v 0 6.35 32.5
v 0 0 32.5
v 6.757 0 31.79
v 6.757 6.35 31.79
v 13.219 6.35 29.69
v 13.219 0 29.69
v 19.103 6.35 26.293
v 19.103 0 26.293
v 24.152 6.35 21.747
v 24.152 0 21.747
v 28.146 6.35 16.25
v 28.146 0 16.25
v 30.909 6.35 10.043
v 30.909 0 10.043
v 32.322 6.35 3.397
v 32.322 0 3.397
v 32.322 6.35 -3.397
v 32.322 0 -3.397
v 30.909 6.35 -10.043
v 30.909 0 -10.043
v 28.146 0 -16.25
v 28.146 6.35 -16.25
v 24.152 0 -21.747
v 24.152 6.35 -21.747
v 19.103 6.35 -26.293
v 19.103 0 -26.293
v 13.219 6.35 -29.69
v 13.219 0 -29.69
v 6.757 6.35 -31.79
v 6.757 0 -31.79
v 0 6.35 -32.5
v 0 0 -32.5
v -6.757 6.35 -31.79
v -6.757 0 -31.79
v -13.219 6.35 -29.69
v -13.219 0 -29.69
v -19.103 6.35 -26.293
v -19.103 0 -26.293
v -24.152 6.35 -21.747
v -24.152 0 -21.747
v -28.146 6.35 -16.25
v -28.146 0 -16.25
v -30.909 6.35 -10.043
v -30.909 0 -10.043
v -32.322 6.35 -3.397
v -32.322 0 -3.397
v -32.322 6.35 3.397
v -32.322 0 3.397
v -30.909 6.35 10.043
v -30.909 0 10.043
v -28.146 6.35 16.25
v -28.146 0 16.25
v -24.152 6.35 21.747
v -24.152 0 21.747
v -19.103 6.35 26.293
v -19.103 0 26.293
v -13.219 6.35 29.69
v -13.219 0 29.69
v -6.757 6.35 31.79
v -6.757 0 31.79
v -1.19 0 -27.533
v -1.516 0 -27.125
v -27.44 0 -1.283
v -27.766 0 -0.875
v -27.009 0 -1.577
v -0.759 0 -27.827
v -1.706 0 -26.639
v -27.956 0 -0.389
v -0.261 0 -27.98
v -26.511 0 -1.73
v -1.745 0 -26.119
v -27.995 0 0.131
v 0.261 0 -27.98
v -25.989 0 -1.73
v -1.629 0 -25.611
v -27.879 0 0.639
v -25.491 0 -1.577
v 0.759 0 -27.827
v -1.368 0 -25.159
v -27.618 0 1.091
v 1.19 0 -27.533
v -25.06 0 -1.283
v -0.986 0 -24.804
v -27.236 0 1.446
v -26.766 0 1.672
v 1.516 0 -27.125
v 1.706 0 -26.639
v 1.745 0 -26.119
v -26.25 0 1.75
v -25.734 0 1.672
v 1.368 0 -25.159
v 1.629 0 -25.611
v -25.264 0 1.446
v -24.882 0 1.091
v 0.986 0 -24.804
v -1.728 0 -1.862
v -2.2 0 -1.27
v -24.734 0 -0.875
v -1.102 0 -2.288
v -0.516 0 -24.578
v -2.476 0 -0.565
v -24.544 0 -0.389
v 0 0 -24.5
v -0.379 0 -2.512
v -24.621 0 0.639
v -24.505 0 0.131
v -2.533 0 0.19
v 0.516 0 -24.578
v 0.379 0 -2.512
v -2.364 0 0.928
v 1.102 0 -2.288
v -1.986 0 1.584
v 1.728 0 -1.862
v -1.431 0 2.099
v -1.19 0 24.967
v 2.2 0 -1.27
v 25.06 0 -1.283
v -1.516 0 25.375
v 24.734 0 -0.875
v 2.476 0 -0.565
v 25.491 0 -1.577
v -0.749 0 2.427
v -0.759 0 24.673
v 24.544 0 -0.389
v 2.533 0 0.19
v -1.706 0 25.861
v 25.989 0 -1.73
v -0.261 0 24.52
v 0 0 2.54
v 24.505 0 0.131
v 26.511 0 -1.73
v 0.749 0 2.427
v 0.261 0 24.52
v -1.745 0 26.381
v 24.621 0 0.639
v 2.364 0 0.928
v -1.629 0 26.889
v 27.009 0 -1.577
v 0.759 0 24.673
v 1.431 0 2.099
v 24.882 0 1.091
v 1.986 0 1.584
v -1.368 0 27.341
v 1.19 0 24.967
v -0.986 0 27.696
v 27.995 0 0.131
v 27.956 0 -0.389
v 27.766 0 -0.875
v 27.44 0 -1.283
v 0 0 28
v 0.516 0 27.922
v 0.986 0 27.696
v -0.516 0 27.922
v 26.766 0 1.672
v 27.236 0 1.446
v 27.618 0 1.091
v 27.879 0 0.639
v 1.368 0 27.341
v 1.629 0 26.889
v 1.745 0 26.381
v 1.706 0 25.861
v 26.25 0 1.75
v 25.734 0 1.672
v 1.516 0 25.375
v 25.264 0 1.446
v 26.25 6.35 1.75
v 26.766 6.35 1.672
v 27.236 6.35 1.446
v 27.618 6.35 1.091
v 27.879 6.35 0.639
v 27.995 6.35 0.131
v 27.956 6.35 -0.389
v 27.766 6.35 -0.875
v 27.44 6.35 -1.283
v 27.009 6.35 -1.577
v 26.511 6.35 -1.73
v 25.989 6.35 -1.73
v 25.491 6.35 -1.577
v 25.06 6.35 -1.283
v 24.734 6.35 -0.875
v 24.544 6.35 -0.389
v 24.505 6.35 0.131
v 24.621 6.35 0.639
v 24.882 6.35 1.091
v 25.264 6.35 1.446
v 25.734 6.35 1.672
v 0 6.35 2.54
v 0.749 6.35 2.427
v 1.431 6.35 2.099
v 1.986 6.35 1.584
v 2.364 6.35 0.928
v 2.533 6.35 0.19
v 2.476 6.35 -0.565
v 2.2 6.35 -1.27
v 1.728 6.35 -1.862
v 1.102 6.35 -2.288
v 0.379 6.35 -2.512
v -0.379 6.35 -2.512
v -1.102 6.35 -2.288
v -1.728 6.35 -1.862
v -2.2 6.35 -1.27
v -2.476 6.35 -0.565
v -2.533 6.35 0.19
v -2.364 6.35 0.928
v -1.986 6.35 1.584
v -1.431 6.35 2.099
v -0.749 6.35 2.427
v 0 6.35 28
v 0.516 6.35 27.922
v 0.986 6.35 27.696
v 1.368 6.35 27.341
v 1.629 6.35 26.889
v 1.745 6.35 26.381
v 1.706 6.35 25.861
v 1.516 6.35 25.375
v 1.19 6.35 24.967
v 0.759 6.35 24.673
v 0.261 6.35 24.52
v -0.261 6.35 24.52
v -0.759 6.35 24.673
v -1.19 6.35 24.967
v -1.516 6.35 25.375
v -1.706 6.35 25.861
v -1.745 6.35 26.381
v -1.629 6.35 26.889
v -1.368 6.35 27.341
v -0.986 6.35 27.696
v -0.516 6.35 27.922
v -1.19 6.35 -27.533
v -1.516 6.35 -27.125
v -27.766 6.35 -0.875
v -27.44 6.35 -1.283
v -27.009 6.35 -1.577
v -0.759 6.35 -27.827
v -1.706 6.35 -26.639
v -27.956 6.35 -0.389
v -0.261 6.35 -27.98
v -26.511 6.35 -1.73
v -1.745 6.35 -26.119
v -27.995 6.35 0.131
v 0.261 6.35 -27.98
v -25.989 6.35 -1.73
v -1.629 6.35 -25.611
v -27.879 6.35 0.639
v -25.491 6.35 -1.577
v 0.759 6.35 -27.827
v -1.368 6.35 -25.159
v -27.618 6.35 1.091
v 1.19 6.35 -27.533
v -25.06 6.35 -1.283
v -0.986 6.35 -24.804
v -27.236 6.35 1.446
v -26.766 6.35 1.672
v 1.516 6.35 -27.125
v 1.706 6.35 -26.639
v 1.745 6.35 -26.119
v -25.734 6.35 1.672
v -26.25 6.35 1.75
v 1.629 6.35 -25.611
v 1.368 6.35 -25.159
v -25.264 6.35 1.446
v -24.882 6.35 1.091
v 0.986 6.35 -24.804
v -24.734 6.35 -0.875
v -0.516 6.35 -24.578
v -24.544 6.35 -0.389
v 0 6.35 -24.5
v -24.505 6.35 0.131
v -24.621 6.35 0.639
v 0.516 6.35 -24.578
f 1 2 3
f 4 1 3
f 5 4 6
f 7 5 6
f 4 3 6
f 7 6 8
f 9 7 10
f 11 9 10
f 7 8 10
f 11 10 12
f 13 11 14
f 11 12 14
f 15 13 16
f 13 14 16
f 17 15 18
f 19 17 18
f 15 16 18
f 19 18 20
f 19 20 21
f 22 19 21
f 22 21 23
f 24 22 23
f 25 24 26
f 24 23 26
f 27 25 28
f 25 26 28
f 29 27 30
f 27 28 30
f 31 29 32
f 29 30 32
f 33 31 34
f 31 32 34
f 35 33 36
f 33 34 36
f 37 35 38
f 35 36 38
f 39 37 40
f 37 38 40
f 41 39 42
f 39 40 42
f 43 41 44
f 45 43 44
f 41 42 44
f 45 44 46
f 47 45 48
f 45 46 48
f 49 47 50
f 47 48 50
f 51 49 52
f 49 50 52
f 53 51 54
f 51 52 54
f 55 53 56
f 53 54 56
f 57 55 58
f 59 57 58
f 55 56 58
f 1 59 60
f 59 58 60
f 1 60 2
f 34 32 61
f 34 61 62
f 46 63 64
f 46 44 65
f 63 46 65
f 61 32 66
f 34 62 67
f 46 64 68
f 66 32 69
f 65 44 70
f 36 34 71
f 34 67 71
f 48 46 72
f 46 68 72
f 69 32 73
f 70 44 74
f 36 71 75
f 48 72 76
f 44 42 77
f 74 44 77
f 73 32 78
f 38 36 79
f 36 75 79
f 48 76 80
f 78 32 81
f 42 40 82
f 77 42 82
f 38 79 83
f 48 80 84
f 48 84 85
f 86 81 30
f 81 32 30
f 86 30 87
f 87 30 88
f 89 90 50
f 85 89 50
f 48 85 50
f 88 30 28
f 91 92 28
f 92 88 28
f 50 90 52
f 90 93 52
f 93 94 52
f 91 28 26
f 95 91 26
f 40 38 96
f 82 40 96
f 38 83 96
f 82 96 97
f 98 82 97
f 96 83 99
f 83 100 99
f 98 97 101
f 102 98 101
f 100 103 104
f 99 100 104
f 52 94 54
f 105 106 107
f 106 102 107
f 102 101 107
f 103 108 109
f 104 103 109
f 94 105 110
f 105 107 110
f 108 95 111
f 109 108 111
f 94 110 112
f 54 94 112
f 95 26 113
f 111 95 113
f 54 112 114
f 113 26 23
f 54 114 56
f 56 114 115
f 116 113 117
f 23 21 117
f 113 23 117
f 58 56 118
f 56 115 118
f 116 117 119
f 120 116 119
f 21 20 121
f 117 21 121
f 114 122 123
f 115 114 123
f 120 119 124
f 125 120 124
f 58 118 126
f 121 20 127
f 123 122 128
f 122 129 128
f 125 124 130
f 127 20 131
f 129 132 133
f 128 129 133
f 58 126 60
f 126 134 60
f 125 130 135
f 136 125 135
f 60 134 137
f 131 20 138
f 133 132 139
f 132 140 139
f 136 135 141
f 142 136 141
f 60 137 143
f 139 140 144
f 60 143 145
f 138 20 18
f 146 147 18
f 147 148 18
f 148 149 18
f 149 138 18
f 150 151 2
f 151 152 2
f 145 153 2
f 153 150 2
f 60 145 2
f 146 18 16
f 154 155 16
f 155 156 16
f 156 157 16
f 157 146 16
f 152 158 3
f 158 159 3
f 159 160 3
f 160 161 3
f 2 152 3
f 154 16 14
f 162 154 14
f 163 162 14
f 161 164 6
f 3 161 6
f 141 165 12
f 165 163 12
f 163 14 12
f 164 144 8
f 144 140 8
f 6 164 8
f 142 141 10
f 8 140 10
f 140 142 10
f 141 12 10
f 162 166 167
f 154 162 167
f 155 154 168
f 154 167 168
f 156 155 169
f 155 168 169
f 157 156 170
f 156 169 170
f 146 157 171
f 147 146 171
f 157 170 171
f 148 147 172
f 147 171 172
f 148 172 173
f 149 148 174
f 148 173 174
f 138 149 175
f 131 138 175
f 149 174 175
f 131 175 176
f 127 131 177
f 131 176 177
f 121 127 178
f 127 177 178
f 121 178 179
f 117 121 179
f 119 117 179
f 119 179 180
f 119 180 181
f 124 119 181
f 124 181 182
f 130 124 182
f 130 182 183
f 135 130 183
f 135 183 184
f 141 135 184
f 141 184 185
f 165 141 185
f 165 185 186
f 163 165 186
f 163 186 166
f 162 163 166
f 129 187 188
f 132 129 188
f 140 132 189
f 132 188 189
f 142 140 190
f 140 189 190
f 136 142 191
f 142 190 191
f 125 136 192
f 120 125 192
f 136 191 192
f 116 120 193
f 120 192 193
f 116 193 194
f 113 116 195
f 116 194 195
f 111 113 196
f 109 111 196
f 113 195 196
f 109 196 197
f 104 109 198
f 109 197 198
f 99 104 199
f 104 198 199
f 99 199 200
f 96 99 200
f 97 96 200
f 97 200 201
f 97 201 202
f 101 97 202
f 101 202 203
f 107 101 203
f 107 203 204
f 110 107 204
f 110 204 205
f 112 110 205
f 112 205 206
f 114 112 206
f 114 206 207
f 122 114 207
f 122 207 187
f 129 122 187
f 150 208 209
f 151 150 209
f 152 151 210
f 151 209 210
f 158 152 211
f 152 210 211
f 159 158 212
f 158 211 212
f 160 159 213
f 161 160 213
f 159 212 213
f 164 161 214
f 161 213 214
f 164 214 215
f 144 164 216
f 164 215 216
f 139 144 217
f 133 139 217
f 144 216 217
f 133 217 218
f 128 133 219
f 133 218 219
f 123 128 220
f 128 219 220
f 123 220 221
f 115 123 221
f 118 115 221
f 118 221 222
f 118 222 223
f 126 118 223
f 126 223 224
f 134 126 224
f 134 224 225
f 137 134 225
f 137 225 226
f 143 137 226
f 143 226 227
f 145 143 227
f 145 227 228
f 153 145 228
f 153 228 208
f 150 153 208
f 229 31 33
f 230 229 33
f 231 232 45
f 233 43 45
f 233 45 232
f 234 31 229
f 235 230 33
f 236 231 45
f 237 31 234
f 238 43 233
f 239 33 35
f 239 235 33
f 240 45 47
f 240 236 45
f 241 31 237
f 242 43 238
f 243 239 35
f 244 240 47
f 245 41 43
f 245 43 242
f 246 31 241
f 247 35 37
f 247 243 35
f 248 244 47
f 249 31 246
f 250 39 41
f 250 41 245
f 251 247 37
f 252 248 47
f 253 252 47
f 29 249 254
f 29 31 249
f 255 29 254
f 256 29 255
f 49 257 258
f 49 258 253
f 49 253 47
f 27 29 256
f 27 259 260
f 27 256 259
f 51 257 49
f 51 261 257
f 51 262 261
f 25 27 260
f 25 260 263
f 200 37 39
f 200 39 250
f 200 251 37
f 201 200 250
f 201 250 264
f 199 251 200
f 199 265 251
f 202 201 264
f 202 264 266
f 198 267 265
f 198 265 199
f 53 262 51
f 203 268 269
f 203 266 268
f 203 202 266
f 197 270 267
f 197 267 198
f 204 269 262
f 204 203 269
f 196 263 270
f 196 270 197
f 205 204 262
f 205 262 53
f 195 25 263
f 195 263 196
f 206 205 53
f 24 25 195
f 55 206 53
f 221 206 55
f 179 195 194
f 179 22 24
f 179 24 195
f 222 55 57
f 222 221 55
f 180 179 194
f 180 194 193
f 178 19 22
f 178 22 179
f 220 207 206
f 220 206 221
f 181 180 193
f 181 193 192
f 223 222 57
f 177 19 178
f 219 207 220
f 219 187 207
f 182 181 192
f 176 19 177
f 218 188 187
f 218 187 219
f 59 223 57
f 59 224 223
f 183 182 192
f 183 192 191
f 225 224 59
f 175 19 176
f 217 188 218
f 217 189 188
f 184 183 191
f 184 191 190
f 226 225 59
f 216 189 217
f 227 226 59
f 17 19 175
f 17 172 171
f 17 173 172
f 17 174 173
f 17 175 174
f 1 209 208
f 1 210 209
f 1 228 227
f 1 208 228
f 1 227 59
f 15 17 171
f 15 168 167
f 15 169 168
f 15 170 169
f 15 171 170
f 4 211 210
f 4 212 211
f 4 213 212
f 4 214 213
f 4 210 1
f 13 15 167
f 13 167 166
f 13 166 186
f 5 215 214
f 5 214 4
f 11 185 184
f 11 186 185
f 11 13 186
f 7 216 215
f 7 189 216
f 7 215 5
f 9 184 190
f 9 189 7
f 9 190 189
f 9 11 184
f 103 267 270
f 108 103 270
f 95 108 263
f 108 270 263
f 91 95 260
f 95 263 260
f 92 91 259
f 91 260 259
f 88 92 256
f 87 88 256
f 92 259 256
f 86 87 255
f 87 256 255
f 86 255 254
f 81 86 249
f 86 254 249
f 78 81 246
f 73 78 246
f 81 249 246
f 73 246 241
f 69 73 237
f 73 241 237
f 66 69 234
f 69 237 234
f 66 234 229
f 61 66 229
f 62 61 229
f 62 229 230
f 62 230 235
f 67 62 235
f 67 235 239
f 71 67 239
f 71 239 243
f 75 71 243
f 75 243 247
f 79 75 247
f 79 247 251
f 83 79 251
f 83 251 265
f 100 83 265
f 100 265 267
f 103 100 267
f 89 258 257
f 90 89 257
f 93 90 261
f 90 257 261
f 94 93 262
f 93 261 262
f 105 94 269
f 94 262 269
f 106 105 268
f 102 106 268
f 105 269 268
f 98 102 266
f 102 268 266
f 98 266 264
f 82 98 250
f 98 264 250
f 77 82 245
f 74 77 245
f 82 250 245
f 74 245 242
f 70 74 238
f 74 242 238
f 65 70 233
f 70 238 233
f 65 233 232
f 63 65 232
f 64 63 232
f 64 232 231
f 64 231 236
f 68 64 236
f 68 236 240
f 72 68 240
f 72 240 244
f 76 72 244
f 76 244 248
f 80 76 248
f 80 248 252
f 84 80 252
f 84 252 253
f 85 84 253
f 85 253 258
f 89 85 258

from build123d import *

# Parameters (mm, degrees)
SKETCH1_R               = 32.5
BOSS_EXTRUDE1_DEPTH     = 6.35
ESQUISSE1_R             = 2.54
ENL_V_MAT_EXTRU_1_DEPTH = 47.398518295
ESQUISSE3_R             = 1.75
ENL_V_MAT_EXTRU_2_DEPTH = 47.398518295


with BuildPart() as part:
    # Sketch1 → Boss-Extrude1 (new body)
    with BuildSketch(Plane(origin=(0, 0, 0), x_dir=(1, 0, 0), z_dir=(0, 1, 0))):
        with Locations(Location((0, 0, 0), (0, 0, 270))):
            Circle(SKETCH1_R)
    extrude(amount=BOSS_EXTRUDE1_DEPTH)

    # Esquisse1 → Enlèv. mat.-Extru.1 (cut, through all)
    with BuildSketch(Plane(origin=(0, 6.35, 0), x_dir=(1, 0, 0), z_dir=(0, 1, 0))):
        with Locations(Location((0, 0, 0), (0, 0, 270))):
            Circle(ESQUISSE1_R)
    extrude(amount=-ENL_V_MAT_EXTRU_1_DEPTH, mode=Mode.SUBTRACT)

    # Esquisse3 → Enlèv. mat.-Extru.2 (cut, through all)
    with BuildSketch(Plane(origin=(0, 6.35, 0), x_dir=(1, 0, 0), z_dir=(0, 1, 0))):
        with Locations(Location((0, -26.25, 0), (0, 0, 270))):
            Circle(ESQUISSE3_R)
        with Locations(Location((26.25, 0, 0), (0, 0, 270))):
            Circle(ESQUISSE3_R)
        with Locations(Location((0, 26.25, 0), (0, 0, 270))):
            Circle(ESQUISSE3_R)
        with Locations(Location((-26.25, 0, 0), (0, 0, 270))):
            Circle(ESQUISSE3_R)
    extrude(amount=-ENL_V_MAT_EXTRU_2_DEPTH, mode=Mode.SUBTRACT)


solid = part.part
